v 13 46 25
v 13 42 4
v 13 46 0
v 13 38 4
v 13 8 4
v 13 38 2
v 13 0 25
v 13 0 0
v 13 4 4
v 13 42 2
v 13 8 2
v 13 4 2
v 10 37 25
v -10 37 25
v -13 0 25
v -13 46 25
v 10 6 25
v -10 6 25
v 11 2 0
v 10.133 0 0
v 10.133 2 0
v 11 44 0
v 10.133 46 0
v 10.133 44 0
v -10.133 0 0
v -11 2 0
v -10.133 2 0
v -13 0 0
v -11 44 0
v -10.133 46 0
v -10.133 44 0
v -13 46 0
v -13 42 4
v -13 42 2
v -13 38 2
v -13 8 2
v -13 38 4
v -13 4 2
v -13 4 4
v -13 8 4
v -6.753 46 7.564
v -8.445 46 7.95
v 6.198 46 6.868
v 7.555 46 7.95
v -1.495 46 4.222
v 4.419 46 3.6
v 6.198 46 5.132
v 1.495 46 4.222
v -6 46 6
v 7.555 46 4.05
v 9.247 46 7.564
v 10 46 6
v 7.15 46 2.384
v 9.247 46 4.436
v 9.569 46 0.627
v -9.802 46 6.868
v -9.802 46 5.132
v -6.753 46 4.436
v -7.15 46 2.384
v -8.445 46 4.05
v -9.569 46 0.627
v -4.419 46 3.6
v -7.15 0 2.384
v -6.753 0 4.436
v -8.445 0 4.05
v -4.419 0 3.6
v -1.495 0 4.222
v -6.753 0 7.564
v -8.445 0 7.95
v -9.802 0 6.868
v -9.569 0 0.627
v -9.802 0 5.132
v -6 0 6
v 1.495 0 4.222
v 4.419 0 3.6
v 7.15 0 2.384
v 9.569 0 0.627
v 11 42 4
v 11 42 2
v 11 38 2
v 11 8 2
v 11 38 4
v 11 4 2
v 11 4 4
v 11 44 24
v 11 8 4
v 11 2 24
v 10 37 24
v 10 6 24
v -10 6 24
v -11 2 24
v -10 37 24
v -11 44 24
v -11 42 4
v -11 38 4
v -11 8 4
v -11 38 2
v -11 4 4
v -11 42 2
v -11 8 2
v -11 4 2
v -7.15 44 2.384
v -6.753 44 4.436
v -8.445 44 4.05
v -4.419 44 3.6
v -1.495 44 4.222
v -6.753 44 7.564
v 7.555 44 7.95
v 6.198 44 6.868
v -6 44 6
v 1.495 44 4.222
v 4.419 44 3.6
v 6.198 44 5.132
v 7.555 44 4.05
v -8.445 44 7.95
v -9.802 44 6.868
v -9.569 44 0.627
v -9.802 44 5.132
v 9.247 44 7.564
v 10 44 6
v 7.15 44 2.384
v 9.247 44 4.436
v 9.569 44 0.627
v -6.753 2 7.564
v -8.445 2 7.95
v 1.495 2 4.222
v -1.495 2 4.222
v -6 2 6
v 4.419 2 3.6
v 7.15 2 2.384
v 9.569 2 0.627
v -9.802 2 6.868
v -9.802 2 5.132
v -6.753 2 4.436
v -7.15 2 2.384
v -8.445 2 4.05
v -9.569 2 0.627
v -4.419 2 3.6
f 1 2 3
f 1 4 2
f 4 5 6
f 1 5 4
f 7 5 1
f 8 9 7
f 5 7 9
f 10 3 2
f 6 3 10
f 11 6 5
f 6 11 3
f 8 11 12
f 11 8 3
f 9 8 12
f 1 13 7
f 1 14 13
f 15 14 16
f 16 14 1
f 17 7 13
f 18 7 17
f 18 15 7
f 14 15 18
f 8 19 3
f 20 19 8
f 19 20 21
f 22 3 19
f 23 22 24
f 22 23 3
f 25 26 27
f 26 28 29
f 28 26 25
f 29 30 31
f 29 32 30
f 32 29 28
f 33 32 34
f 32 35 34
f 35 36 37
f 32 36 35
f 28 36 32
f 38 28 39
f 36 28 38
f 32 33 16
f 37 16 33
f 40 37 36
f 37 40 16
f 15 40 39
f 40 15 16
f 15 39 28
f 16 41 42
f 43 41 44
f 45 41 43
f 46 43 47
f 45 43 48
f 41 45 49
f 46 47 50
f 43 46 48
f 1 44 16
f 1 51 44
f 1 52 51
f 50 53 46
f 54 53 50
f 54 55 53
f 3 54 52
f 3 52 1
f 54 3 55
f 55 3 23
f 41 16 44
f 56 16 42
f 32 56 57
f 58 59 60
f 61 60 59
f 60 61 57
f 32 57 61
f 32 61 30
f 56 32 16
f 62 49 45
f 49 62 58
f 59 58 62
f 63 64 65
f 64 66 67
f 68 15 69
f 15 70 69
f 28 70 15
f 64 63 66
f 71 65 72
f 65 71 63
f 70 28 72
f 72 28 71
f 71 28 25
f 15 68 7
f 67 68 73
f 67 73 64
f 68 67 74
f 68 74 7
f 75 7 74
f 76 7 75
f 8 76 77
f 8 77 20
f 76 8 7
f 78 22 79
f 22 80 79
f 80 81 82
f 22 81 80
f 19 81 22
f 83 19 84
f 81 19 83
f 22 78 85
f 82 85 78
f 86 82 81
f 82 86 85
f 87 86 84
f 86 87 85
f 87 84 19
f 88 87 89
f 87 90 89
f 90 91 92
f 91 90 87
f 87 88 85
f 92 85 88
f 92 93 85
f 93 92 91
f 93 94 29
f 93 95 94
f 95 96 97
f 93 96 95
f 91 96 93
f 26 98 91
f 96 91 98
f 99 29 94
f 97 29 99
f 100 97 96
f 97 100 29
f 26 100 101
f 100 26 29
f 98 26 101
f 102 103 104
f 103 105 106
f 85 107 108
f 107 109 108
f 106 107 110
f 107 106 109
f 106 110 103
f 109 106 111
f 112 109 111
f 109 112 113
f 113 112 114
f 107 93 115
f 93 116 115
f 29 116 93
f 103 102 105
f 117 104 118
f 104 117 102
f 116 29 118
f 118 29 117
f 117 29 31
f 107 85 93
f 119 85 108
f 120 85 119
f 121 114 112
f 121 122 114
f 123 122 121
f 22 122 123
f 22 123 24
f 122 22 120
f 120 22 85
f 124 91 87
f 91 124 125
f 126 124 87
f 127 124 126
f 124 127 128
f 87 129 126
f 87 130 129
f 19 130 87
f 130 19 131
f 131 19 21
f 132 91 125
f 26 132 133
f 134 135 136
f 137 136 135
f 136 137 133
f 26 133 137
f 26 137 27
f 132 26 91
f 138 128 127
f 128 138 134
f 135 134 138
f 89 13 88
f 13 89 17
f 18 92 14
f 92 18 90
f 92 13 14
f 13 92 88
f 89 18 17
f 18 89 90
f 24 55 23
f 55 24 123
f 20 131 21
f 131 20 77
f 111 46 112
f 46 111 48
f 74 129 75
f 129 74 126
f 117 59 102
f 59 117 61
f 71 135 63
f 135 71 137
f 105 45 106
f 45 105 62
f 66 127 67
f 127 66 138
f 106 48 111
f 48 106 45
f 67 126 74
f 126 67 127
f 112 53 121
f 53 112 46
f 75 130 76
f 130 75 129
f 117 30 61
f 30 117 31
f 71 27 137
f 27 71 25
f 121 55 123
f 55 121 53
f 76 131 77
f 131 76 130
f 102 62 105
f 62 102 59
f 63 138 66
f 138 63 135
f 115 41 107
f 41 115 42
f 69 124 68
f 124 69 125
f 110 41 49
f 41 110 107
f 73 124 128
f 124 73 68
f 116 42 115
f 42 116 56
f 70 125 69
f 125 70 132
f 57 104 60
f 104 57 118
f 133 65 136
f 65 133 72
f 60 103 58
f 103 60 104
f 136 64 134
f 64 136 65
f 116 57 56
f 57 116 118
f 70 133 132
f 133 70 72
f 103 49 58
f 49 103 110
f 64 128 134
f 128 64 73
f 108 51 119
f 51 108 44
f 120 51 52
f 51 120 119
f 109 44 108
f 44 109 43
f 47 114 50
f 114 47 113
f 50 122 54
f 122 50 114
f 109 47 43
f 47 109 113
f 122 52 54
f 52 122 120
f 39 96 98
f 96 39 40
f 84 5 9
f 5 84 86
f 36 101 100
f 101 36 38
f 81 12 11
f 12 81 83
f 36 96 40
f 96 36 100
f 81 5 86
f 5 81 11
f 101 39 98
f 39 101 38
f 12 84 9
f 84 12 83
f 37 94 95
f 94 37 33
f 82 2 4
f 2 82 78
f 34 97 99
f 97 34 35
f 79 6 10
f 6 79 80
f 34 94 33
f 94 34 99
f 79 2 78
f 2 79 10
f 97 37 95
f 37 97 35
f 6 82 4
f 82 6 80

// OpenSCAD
difference() {
translate([-13,0,0])
difference() {
  cube([26,46,25]);
  translate([2,2,-1])
    cube([22,42,25]);
  translate([3,6,0])
    cube([20,31,26]);
}

translate([0,49,-10])
rotate([90,0,0])
cylinder(50,14.3,14.3);

translate([-8,49,6])
rotate([90,0,0])
cylinder(50,2,2);

translate([8,59,6])
rotate([90,0,0])
cylinder(50,2,2);

translate([-15,4,2])
cube([30,4,2]);

translate([-15,38,2])
cube([30,4,2]);
}
